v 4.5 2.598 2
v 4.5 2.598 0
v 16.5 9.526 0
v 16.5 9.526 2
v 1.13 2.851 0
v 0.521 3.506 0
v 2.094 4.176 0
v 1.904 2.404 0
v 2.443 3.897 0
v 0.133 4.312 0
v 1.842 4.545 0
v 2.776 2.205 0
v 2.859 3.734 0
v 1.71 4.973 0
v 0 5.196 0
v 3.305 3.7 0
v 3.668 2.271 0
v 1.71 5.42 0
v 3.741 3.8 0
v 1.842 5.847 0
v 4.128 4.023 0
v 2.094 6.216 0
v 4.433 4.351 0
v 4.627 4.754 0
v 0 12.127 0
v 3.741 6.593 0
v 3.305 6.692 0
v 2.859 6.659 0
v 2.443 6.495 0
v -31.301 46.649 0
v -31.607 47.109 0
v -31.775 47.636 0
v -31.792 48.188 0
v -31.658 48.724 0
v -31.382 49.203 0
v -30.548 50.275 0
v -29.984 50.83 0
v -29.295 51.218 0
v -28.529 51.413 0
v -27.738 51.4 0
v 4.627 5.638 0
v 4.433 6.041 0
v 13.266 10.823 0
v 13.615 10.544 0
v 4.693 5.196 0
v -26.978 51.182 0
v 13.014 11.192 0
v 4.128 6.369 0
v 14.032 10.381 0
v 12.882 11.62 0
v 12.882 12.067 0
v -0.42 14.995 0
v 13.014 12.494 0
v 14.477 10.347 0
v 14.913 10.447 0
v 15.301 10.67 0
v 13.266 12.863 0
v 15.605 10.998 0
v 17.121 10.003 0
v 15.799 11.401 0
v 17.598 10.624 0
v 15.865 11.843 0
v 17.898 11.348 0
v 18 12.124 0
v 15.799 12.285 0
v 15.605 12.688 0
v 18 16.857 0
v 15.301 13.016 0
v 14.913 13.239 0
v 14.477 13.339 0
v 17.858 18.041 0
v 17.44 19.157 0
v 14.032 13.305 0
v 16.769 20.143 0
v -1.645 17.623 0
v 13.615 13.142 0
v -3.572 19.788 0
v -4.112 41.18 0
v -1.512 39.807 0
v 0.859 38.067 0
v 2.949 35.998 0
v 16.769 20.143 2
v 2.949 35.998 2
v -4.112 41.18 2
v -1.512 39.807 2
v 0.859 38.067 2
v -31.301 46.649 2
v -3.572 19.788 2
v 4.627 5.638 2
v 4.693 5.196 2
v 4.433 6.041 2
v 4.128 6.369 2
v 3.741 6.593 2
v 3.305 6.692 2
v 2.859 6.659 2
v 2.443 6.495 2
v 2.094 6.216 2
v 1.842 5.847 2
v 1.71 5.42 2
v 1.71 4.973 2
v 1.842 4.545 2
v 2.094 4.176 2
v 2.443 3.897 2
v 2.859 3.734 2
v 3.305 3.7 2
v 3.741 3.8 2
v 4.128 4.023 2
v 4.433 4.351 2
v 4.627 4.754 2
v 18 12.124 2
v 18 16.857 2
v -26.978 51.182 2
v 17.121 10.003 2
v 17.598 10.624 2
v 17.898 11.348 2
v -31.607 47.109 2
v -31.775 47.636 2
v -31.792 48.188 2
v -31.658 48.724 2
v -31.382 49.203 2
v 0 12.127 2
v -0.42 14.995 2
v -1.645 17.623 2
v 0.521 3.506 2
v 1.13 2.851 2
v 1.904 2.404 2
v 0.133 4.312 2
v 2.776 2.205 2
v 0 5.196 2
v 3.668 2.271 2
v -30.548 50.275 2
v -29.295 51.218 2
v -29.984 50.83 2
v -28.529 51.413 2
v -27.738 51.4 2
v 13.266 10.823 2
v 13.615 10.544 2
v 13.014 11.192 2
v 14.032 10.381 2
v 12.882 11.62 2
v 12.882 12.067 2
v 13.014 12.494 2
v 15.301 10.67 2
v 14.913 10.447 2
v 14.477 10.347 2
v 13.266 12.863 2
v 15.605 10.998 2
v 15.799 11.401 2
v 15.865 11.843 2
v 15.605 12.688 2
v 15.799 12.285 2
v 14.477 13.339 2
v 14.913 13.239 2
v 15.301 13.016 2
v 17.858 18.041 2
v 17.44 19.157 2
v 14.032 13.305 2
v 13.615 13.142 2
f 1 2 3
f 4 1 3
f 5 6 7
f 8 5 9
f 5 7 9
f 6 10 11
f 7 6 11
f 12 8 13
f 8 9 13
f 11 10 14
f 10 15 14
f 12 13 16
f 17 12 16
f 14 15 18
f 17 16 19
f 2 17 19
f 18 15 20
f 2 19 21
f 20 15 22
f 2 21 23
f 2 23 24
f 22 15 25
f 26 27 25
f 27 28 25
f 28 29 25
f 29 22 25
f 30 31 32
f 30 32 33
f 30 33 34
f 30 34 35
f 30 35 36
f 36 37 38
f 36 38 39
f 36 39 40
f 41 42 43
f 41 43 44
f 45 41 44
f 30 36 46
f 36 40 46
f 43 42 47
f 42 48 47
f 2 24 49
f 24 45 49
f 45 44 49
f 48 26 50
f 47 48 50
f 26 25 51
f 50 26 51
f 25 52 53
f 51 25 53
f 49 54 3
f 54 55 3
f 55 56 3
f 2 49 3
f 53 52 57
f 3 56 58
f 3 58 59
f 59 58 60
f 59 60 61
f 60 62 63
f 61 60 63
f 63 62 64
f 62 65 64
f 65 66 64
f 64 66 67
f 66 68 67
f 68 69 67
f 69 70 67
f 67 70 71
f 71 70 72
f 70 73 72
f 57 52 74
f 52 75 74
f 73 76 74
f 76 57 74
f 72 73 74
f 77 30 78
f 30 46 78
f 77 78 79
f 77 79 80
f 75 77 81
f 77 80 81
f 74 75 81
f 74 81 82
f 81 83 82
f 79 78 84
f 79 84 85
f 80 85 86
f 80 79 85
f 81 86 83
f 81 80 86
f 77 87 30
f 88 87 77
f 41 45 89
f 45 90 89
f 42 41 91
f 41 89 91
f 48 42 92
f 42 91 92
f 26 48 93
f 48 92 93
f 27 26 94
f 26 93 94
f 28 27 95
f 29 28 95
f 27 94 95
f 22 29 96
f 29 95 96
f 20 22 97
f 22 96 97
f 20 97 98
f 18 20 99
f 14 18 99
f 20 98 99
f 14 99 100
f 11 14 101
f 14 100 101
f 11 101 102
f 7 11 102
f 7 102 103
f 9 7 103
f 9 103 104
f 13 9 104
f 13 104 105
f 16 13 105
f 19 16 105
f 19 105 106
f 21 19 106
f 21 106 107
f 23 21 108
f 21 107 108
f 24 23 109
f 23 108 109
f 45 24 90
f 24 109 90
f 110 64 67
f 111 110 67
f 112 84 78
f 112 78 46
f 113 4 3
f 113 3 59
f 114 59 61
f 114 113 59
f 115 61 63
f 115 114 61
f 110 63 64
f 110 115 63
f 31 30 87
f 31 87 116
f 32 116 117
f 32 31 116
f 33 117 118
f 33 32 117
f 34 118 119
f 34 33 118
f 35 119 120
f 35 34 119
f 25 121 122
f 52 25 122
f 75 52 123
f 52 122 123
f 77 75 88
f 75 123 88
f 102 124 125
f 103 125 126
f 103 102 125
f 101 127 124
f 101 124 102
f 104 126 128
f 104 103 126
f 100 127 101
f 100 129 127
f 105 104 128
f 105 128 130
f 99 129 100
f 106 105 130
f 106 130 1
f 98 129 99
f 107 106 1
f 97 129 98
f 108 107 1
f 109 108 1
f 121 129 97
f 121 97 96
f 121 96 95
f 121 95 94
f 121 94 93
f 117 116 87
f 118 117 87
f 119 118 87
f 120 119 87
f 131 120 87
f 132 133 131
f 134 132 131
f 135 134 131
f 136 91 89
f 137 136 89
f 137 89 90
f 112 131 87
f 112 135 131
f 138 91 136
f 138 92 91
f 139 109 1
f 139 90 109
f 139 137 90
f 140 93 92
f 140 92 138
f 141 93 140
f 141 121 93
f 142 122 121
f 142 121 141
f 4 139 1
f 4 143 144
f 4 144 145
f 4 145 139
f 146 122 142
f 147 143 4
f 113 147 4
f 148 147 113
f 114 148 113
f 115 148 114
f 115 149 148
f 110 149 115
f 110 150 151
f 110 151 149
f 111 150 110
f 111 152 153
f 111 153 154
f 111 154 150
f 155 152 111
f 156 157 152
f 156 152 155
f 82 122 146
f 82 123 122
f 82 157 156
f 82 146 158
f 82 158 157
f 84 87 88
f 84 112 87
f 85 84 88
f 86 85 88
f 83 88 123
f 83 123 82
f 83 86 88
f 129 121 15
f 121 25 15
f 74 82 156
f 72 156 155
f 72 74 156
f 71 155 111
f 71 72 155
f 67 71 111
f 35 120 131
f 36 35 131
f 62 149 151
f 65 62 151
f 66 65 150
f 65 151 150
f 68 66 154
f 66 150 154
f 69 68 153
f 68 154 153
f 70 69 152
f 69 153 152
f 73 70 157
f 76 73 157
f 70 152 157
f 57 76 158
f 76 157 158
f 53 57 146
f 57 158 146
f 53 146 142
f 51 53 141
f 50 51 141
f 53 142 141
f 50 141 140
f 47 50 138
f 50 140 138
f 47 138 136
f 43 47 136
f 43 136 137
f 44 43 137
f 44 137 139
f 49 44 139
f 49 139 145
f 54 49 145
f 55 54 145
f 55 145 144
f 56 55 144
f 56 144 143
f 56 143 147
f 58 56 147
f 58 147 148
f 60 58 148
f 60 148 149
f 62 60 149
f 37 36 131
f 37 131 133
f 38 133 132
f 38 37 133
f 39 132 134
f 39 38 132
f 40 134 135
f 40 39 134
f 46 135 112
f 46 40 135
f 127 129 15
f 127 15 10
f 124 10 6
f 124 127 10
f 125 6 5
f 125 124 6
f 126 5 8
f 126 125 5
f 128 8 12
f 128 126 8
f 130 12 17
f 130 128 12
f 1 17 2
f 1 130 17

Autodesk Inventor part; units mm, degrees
ref_plane "YZ Plane" through (0, 0, 0) normal (1, 0, 0) x (0, 1, 0)
ref_plane "XZ Plane" through (0, 0, 0) normal (0, 1, 0) x (-1, 0, 0)
ref_plane "XY Plane" through (0, 0, 0) normal (0, 0, 1) x (1, 0, 0)
sketch "Sketch1" plane through (0, 0, 0) normal (0, 0, 1) x (1, 0, 0)
  line L0 (0, 0) -> (18, 0)
  line L1 (18, 0) -> (18, 30)
  line L2 (18, 30) -> (0, 30)
  line L3 (0, 30) -> (0, 0)
  line L4 (0, 0) -> (18, 10.3923)
  line L5 (0, 0) -> (20.7846, 0) construction
  dimension "d0" = 18
  dimension "d1" = 30
  dimension "d2" = 30
extrude "Extrusion1" add sketch "Sketch1" along normal blind 2 contours L3 L2 L1 L4
fillet "Fillet1" radius 3 2 edges at (0, 0, 1) (18, 10.3923, 1)
sketch "Sketch2" plane through (0, 0, 2) normal (0, 0, 1) x (1, 0, 0)
  arc A0 (0, 5.1962) -> (4.5, 2.5981) centre (3, 5.1962) ccw projected
  arc A1 (16.5, 9.5263) -> (18, 12.1244) centre (15, 12.1244) ccw projected
  line L0 (4.5, 2.5981) -> (16.5, 9.5263) projected
  line L1 (10.5, 6.0622) -> (8.7793, 8.5196)
  line L2 (10.5, 6.0622) -> (13.5, 6.0622) construction
  line L3 (8.7793, 8.5196) -> (3.1932, 5.1962)
  line L4 (3.1932, 5.1962) -> (14.3654, 11.8431)
  circle A2 centre (3.1932, 5.1962) radius 1.5
  circle A3 centre (14.3654, 11.8431) radius 1.5
  point P0 (0, 0)
  dimension "d8" = 3
  dimension "d9" = 125
  dimension "d10" = 6.5
  dimension "d11" = 13
  dimension "d12" = 3
  dimension "d13" = 3
extrude "Extrusion2" cut sketch "Sketch2" against normal blind 2
sketch "Sketch3" plane through (0, 0, 2) normal (0, 0, 1) x (1, 0, 0)
  line L0 (18, 12.1244) -> (18, 30) projected
  line L1 (18, 30) -> (4.0584, 13.3851)
  line L2 (18, 30) -> (39.6893, 30) construction
  line L3 (4.0584, 13.3851) -> (-34.2438, 45.5244)
  line L4 (-34.2438, 45.5244) -> (-20.9174, 62.6556)
  line L5 (-20.9174, 62.6556) -> (18, 30)
  point P0 (0, 0)
  dimension "d16" = 130
  dimension "d17" = 50
  dimension "d18" = 90
extrude "Extrusion3" cut sketch "Sketch3" against normal blind 2
extrude "Extrusion4" add sketch "Sketch3" against normal blind 2
fillet "Fillet2" radius 10 2 edges at (18, 30, 1) (0, 16.7905, 1)
chamfer "Chamfer1" distance 5 distance2 40 1 edges at (-20.9174, 62.6556, 1) measured on face at (-25.3595, 56.9452, 1.3333)
fillet "Fillet3" radius 20 1 edges at (9.7244, 36.9441, 1)
sketch "Sketch4" plane through (0, 0, 2) normal (0, 0, 1) x (1, 0, 0)
  line L0 (-23.9874, 58.7091) -> (8.6742, 37.6221) projected
  line L1 (-7.6566, 48.1656) -> (18, 18.7306)
  line L2 (18, 12.1244) -> (18, 25.3369) projected
  line L3 (-7.6566, 48.1656) -> (3.9893, 54.5621)
  line L4 (3.9893, 54.5621) -> (27.8287, 24.1291)
  line L5 (27.8287, 24.1291) -> (18, 18.7306)
  point P0 (0, 0)
extrude "Extrusion5" cut sketch "Sketch4" against normal blind 2
fillet "Fillet4" radius 5 1 edges at (18, 18.7306, 1)
sketch "Sketch5" plane through (0, 0, 2) normal (0, 0, 1) x (1, 0, 0)
  line L0 (16.7692, 20.1427) -> (-7.6566, 48.1656) projected
  line L1 (0, 39.3814) -> (-29.1156, 52.1168)
  line L2 (-34.2438, 45.5244) -> (-23.9874, 58.7091) projected
  line L3 (-29.1156, 52.1168) -> (-28.0652, 63.5725)
  line L4 (-28.0652, 63.5725) -> (-0.6496, 57.8446)
  line L5 (-0.6496, 57.8446) -> (0, 39.3814)
  point P0 (0, 0)
extrude "Extrusion6" cut sketch "Sketch5" against normal blind 2
fillet "Fillet5" radius 20 1 edges at (0, 39.3814, 1)
fillet "Fillet6" radius 3 1 edges at (-29.1156, 52.1168, 1)
chamfer "Chamfer2" distance 20 distance2 3 1 edges at (-34.2438, 45.5244, 1) measured on face at (-24.0199, 36.9456, 1.3333)
fillet "Fillet7" radius 2 1 edges at (-32.4018, 47.8923, 1)
sketch "Sketch6" plane through (0, 0, 2) normal (0, 0, 1) x (1, 0, 0)
  line L0 (-31.3011, 46.6491) -> (-18.9229, 32.6687) projected
  arc A0 (0, 12.1274) -> (-3.5721, 19.7878) centre (-10, 12.1274) ccw projected
  line L1 (-31.3011, 46.6491) -> (-3.5721, 19.7878)
  line L2 (-3.5721, 19.7878) -> (-20.8807, 12.1274)
  arc A1 (-31.3823, 49.203) -> (-31.3011, 46.6491) centre (-29.8037, 47.9749) ccw projected
  line L3 (-20.8807, 12.1274) -> (-31.3011, 46.6491)
  point P0 (0, 0)
extrude "Extrusion7" cut sketch "Sketch6" against normal blind 10
properties part number "Claw Tip"
